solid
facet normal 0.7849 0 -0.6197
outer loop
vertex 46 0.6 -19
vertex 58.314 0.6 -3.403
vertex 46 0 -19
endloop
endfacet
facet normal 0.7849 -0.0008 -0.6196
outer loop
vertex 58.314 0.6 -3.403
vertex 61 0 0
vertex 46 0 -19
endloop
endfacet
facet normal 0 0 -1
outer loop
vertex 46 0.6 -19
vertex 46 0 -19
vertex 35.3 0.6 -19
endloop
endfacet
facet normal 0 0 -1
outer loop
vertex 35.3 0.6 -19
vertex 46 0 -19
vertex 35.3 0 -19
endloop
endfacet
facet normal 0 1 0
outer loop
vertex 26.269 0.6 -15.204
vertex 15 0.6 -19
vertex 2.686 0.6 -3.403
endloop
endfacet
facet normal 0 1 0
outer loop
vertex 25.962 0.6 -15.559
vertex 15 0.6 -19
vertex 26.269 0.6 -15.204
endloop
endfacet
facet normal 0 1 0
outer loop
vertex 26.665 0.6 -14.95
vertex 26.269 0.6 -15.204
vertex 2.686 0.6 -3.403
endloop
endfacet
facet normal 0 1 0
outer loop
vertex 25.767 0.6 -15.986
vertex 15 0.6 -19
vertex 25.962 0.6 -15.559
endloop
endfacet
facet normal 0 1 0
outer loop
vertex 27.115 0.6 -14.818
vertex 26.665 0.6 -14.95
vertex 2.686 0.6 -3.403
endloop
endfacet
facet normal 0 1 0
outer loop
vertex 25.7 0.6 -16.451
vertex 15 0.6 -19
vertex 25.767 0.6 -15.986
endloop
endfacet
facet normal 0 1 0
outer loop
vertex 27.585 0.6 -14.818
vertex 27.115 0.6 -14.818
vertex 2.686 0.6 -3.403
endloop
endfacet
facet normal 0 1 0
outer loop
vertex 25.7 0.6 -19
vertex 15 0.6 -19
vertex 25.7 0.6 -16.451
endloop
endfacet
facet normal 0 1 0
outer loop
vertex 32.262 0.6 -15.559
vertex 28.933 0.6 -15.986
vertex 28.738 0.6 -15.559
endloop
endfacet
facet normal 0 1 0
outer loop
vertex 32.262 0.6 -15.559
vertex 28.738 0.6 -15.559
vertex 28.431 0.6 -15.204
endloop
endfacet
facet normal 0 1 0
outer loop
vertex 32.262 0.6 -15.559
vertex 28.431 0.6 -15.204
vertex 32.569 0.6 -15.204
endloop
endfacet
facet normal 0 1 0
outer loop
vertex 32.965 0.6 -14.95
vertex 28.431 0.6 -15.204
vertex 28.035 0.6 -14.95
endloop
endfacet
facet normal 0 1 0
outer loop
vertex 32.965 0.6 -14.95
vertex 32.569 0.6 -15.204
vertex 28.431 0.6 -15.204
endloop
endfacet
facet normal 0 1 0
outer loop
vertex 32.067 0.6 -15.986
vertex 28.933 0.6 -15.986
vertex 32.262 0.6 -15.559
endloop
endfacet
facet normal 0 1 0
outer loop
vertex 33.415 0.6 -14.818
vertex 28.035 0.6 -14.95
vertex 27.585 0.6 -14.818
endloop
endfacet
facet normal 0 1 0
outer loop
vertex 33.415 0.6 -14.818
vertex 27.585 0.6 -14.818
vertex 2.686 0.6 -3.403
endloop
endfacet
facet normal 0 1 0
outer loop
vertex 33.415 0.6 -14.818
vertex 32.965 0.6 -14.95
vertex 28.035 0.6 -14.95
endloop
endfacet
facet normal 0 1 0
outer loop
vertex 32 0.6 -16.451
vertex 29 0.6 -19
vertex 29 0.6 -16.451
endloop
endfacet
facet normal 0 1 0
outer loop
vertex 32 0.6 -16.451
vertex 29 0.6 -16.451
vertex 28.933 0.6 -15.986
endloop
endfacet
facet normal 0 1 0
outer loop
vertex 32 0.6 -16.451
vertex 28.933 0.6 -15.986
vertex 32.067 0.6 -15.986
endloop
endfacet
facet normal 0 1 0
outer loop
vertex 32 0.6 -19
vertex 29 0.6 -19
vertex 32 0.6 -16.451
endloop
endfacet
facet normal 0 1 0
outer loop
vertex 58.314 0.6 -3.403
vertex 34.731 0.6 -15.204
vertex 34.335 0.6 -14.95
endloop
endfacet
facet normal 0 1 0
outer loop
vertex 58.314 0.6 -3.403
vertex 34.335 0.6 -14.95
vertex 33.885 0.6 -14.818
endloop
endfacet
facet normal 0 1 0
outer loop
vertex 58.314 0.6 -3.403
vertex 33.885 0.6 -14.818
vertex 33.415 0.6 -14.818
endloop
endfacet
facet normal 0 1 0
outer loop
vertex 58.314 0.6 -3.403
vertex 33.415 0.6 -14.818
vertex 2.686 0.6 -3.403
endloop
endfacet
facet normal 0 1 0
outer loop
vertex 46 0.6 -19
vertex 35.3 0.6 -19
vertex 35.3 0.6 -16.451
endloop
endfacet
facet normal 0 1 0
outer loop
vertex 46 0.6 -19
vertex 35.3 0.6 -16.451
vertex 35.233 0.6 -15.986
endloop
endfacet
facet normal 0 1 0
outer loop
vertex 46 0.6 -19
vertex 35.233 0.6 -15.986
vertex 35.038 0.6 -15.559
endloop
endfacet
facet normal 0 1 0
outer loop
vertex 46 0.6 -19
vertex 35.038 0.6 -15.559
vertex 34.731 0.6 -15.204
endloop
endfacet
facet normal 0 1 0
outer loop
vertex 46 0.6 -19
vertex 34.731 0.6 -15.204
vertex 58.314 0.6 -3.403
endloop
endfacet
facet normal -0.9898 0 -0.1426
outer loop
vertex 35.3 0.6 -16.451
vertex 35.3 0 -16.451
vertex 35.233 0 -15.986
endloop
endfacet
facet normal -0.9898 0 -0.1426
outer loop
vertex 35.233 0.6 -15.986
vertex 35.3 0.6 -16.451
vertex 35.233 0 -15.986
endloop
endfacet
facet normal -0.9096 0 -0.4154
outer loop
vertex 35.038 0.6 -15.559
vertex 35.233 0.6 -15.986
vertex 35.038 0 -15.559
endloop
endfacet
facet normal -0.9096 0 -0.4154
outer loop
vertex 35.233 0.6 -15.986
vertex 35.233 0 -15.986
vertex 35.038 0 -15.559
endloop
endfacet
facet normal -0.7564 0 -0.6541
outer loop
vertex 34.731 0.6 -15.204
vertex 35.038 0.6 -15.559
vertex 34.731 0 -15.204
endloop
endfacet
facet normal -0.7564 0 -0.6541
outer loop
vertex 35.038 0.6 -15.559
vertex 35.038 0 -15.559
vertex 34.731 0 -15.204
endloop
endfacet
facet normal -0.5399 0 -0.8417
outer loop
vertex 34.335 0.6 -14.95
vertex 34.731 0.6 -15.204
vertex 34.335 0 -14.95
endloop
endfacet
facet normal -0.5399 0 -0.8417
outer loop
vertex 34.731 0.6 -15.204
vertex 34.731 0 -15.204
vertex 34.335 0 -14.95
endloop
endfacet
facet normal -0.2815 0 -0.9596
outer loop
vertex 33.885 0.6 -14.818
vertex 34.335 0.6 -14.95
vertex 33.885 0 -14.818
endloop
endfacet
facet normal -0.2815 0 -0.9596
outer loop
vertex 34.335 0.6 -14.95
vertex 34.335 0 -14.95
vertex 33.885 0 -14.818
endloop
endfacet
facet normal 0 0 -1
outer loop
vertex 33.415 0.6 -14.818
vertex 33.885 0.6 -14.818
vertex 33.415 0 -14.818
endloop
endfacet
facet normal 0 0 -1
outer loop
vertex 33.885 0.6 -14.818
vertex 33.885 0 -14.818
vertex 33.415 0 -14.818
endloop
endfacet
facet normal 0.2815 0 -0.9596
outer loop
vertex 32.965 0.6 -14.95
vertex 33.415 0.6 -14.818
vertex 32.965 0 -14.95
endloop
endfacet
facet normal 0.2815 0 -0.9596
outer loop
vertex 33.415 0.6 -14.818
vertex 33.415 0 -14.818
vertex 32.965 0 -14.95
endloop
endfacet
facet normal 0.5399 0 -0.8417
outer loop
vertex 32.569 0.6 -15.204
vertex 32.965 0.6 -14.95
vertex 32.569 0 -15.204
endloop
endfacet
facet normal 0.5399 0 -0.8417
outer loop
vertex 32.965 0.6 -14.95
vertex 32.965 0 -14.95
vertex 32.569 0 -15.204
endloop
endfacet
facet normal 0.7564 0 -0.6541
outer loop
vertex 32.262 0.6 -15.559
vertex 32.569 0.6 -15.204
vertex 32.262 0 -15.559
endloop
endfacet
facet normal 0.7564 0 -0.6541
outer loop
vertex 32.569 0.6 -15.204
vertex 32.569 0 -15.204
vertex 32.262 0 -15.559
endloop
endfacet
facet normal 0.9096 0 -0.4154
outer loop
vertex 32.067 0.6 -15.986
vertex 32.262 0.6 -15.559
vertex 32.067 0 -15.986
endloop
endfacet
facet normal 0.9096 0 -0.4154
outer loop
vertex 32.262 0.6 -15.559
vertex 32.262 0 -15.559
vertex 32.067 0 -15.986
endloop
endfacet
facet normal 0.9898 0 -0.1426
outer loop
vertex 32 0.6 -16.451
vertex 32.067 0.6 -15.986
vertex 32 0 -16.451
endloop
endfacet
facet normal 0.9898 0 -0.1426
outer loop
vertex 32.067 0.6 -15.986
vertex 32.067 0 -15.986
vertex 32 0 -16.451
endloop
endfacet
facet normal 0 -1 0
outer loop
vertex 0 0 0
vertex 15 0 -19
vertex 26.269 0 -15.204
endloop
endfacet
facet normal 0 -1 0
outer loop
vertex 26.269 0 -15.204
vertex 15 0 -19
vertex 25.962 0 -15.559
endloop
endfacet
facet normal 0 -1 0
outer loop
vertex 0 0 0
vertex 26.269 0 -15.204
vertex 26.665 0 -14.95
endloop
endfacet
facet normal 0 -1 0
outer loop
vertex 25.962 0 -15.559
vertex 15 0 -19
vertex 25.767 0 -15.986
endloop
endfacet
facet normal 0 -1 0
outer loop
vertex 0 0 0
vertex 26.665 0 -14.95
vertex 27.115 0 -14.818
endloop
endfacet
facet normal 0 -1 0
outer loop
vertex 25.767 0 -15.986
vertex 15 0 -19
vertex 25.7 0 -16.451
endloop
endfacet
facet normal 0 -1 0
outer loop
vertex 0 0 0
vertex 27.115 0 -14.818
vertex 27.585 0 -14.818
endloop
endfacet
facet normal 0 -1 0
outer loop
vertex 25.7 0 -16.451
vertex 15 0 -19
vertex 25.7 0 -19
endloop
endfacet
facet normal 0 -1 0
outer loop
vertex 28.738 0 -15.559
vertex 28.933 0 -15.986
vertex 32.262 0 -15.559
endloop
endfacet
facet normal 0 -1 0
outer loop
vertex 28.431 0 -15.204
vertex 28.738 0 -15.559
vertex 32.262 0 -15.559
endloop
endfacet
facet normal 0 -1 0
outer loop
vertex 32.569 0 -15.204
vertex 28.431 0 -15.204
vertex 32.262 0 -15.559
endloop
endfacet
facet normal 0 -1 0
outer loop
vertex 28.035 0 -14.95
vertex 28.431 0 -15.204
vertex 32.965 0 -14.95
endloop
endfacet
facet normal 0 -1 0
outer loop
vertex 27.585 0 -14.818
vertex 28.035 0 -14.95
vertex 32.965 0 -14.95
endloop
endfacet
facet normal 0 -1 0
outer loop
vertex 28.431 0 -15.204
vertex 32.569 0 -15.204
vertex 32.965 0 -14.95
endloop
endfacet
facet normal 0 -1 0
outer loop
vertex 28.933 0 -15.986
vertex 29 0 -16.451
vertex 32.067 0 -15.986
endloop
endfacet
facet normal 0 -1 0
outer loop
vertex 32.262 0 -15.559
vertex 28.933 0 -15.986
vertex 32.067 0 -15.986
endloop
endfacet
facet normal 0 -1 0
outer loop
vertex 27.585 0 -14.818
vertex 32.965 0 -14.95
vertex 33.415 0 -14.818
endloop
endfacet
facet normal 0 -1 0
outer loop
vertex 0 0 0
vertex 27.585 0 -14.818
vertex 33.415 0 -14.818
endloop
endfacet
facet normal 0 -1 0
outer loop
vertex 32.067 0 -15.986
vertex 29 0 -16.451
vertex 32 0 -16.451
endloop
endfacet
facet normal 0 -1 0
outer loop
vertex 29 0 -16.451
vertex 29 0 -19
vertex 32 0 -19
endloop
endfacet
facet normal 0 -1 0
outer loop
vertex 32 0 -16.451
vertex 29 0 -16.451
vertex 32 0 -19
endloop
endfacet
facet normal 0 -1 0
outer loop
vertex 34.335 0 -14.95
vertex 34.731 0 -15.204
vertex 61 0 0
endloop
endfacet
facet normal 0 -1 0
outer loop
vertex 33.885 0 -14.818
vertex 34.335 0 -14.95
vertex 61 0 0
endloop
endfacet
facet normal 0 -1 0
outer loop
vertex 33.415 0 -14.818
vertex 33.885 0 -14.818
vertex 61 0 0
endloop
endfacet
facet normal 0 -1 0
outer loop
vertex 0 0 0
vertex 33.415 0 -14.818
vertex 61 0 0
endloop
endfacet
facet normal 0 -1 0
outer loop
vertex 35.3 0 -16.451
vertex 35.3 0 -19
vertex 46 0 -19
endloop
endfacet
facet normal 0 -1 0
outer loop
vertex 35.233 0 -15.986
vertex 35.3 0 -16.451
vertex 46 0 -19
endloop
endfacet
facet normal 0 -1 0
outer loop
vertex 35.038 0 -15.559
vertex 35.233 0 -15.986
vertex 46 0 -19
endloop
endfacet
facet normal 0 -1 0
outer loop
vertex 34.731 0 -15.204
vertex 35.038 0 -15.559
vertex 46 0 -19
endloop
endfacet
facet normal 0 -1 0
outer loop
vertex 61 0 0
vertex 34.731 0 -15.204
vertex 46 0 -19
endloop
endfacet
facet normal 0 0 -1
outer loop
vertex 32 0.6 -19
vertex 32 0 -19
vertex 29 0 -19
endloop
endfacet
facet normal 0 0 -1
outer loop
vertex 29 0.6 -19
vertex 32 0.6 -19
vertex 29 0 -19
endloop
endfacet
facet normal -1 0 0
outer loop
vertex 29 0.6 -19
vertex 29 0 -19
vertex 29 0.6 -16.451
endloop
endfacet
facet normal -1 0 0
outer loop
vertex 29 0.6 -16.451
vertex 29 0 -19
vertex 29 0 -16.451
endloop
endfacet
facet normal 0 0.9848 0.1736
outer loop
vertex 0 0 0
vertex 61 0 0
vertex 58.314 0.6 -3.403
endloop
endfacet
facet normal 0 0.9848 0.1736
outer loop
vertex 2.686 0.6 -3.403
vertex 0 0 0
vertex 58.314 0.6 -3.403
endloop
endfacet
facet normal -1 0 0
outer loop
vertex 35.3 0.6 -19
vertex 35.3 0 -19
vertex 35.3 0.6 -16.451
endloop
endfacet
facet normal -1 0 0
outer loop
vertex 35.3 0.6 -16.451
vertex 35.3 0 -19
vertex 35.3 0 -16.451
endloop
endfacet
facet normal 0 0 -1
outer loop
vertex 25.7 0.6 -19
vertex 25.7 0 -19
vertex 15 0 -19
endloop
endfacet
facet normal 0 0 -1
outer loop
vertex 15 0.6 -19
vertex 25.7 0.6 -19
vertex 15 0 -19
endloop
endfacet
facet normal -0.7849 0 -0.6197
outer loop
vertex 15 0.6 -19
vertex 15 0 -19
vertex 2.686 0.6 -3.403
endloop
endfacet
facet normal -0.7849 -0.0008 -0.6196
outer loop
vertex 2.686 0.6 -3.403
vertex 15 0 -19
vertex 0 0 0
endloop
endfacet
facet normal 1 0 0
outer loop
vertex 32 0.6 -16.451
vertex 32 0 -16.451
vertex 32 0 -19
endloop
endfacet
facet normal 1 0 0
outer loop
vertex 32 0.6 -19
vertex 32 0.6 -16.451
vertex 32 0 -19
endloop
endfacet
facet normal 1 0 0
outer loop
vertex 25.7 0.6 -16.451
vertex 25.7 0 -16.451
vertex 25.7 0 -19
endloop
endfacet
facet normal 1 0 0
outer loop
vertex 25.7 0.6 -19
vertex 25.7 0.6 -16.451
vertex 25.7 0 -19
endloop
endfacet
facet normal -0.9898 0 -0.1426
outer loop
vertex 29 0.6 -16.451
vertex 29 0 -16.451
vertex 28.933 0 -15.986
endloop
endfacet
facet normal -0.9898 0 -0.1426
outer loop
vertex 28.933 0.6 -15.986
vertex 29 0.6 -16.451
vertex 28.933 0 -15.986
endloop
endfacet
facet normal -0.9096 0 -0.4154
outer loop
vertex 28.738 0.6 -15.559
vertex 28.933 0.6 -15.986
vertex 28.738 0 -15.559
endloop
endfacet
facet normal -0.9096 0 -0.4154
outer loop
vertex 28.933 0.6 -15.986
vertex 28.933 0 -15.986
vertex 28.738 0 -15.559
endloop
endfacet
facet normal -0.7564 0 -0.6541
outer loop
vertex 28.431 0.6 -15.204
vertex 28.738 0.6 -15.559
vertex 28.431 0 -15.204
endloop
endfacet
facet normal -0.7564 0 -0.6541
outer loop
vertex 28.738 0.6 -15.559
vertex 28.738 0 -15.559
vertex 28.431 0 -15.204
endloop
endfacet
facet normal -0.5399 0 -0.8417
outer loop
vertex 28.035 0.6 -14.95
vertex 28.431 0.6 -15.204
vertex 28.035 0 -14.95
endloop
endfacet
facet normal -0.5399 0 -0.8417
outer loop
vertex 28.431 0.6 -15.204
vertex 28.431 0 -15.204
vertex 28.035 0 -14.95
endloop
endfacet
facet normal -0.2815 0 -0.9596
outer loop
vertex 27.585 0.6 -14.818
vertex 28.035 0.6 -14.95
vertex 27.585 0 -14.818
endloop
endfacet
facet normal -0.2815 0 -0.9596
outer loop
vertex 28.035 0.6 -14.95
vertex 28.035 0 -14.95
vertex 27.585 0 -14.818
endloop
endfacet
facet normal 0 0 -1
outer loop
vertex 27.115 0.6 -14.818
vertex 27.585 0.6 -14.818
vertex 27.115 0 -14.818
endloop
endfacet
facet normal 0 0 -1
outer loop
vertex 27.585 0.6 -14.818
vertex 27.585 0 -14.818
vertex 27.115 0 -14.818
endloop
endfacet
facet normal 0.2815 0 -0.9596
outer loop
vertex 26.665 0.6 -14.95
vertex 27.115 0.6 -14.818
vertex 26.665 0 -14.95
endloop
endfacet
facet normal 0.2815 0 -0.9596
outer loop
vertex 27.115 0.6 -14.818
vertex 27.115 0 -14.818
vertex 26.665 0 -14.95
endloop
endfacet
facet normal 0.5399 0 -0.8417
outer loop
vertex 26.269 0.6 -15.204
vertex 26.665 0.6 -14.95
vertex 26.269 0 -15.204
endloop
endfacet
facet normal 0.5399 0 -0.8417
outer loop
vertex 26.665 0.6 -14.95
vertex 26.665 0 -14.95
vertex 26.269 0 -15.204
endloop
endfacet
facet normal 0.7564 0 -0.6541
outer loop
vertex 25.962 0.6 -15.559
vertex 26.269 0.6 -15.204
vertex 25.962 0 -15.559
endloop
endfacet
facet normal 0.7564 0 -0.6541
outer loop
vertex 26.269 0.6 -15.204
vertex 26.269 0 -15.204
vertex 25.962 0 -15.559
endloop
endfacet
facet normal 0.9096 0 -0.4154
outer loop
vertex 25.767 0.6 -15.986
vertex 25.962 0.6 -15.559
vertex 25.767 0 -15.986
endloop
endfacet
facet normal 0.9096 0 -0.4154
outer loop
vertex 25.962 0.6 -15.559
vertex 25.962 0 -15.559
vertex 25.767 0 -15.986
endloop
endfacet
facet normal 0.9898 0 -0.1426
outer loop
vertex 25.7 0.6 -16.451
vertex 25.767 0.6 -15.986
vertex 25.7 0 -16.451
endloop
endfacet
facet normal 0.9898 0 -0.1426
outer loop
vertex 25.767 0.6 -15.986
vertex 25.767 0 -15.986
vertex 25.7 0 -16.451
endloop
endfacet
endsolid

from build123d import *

# Parameters (mm, degrees)
BOSS_EXTRUDE1_DEPTH     = 0.6
CHAMFER1_SIZE           = 0.6
CHAMFER1_SIZE_2         = 3.402769092
CUT_EXTRUDE1_DEPTH      = 64.893348637
CUT_EXTRUDE1_DEPTH_BACK = 64.893348637


with BuildPart() as part:
    # Sketch1 → Boss-Extrude1 (new body)
    with BuildSketch(Plane(origin=(0, 0, 0), x_dir=(1, 0, 0), z_dir=(0, 1, 0))):
        Polygon((0, 0), (61, 0), (46, 19), (15, 19), align=None)
    extrude(amount=BOSS_EXTRUDE1_DEPTH)

    # Chamfer1
    # the kernel refuses this chamfer: 3.402769092, 0.6 mm, written as the material it takes off along each edge
    with BuildSketch(Plane(origin=(-8.8422275, 0.6, 0), x_dir=(0, -0.9776715712462579, 0.2101387607674348), z_dir=(1, 0, 0))) as chamfer1_piece_1:
        Polygon((CHAMFER1_SIZE * 0.977671571246, CHAMFER1_SIZE * 0.210138760767), (-CHAMFER1_SIZE_2 * 0.210138760753, CHAMFER1_SIZE_2 * 0.97767157118), (0, 0), align=None)
    extrude(amount=78.684455, mode=Mode.SUBTRACT)

    # Sketch2 → Cut-Extrude1 (cut, two sides: drawn at the far end of the back side and taken through both)
    with BuildSketch(Plane(origin=(0, 0.6, 0), x_dir=(1, 0, 0), z_dir=(0, 1, 0)).offset(-CUT_EXTRUDE1_DEPTH_BACK)):
        with BuildLine():
            Line((25.7, 16.450898266), (25.7, 22.487224665))
            ThreePointArc((25.7, 22.487224665), (27.35, 24.137224665), (29, 22.487224665))
            Line((29, 22.487224665), (29, 16.450898266))
            ThreePointArc((29, 16.450898266), (27.35, 14.800898266), (25.7, 16.450898266))
        make_face()
        with BuildLine():
            Line((32, 16.450898266), (32, 22.487224665))
            ThreePointArc((32, 22.487224665), (33.65, 24.137224665), (35.3, 22.487224665))
            Line((35.3, 22.487224665), (35.3, 16.450898266))
            ThreePointArc((35.3, 16.450898266), (33.65, 14.800898266), (32, 16.450898266))
        make_face()
    extrude(amount=CUT_EXTRUDE1_DEPTH + CUT_EXTRUDE1_DEPTH_BACK, mode=Mode.SUBTRACT)


solid = part.part
